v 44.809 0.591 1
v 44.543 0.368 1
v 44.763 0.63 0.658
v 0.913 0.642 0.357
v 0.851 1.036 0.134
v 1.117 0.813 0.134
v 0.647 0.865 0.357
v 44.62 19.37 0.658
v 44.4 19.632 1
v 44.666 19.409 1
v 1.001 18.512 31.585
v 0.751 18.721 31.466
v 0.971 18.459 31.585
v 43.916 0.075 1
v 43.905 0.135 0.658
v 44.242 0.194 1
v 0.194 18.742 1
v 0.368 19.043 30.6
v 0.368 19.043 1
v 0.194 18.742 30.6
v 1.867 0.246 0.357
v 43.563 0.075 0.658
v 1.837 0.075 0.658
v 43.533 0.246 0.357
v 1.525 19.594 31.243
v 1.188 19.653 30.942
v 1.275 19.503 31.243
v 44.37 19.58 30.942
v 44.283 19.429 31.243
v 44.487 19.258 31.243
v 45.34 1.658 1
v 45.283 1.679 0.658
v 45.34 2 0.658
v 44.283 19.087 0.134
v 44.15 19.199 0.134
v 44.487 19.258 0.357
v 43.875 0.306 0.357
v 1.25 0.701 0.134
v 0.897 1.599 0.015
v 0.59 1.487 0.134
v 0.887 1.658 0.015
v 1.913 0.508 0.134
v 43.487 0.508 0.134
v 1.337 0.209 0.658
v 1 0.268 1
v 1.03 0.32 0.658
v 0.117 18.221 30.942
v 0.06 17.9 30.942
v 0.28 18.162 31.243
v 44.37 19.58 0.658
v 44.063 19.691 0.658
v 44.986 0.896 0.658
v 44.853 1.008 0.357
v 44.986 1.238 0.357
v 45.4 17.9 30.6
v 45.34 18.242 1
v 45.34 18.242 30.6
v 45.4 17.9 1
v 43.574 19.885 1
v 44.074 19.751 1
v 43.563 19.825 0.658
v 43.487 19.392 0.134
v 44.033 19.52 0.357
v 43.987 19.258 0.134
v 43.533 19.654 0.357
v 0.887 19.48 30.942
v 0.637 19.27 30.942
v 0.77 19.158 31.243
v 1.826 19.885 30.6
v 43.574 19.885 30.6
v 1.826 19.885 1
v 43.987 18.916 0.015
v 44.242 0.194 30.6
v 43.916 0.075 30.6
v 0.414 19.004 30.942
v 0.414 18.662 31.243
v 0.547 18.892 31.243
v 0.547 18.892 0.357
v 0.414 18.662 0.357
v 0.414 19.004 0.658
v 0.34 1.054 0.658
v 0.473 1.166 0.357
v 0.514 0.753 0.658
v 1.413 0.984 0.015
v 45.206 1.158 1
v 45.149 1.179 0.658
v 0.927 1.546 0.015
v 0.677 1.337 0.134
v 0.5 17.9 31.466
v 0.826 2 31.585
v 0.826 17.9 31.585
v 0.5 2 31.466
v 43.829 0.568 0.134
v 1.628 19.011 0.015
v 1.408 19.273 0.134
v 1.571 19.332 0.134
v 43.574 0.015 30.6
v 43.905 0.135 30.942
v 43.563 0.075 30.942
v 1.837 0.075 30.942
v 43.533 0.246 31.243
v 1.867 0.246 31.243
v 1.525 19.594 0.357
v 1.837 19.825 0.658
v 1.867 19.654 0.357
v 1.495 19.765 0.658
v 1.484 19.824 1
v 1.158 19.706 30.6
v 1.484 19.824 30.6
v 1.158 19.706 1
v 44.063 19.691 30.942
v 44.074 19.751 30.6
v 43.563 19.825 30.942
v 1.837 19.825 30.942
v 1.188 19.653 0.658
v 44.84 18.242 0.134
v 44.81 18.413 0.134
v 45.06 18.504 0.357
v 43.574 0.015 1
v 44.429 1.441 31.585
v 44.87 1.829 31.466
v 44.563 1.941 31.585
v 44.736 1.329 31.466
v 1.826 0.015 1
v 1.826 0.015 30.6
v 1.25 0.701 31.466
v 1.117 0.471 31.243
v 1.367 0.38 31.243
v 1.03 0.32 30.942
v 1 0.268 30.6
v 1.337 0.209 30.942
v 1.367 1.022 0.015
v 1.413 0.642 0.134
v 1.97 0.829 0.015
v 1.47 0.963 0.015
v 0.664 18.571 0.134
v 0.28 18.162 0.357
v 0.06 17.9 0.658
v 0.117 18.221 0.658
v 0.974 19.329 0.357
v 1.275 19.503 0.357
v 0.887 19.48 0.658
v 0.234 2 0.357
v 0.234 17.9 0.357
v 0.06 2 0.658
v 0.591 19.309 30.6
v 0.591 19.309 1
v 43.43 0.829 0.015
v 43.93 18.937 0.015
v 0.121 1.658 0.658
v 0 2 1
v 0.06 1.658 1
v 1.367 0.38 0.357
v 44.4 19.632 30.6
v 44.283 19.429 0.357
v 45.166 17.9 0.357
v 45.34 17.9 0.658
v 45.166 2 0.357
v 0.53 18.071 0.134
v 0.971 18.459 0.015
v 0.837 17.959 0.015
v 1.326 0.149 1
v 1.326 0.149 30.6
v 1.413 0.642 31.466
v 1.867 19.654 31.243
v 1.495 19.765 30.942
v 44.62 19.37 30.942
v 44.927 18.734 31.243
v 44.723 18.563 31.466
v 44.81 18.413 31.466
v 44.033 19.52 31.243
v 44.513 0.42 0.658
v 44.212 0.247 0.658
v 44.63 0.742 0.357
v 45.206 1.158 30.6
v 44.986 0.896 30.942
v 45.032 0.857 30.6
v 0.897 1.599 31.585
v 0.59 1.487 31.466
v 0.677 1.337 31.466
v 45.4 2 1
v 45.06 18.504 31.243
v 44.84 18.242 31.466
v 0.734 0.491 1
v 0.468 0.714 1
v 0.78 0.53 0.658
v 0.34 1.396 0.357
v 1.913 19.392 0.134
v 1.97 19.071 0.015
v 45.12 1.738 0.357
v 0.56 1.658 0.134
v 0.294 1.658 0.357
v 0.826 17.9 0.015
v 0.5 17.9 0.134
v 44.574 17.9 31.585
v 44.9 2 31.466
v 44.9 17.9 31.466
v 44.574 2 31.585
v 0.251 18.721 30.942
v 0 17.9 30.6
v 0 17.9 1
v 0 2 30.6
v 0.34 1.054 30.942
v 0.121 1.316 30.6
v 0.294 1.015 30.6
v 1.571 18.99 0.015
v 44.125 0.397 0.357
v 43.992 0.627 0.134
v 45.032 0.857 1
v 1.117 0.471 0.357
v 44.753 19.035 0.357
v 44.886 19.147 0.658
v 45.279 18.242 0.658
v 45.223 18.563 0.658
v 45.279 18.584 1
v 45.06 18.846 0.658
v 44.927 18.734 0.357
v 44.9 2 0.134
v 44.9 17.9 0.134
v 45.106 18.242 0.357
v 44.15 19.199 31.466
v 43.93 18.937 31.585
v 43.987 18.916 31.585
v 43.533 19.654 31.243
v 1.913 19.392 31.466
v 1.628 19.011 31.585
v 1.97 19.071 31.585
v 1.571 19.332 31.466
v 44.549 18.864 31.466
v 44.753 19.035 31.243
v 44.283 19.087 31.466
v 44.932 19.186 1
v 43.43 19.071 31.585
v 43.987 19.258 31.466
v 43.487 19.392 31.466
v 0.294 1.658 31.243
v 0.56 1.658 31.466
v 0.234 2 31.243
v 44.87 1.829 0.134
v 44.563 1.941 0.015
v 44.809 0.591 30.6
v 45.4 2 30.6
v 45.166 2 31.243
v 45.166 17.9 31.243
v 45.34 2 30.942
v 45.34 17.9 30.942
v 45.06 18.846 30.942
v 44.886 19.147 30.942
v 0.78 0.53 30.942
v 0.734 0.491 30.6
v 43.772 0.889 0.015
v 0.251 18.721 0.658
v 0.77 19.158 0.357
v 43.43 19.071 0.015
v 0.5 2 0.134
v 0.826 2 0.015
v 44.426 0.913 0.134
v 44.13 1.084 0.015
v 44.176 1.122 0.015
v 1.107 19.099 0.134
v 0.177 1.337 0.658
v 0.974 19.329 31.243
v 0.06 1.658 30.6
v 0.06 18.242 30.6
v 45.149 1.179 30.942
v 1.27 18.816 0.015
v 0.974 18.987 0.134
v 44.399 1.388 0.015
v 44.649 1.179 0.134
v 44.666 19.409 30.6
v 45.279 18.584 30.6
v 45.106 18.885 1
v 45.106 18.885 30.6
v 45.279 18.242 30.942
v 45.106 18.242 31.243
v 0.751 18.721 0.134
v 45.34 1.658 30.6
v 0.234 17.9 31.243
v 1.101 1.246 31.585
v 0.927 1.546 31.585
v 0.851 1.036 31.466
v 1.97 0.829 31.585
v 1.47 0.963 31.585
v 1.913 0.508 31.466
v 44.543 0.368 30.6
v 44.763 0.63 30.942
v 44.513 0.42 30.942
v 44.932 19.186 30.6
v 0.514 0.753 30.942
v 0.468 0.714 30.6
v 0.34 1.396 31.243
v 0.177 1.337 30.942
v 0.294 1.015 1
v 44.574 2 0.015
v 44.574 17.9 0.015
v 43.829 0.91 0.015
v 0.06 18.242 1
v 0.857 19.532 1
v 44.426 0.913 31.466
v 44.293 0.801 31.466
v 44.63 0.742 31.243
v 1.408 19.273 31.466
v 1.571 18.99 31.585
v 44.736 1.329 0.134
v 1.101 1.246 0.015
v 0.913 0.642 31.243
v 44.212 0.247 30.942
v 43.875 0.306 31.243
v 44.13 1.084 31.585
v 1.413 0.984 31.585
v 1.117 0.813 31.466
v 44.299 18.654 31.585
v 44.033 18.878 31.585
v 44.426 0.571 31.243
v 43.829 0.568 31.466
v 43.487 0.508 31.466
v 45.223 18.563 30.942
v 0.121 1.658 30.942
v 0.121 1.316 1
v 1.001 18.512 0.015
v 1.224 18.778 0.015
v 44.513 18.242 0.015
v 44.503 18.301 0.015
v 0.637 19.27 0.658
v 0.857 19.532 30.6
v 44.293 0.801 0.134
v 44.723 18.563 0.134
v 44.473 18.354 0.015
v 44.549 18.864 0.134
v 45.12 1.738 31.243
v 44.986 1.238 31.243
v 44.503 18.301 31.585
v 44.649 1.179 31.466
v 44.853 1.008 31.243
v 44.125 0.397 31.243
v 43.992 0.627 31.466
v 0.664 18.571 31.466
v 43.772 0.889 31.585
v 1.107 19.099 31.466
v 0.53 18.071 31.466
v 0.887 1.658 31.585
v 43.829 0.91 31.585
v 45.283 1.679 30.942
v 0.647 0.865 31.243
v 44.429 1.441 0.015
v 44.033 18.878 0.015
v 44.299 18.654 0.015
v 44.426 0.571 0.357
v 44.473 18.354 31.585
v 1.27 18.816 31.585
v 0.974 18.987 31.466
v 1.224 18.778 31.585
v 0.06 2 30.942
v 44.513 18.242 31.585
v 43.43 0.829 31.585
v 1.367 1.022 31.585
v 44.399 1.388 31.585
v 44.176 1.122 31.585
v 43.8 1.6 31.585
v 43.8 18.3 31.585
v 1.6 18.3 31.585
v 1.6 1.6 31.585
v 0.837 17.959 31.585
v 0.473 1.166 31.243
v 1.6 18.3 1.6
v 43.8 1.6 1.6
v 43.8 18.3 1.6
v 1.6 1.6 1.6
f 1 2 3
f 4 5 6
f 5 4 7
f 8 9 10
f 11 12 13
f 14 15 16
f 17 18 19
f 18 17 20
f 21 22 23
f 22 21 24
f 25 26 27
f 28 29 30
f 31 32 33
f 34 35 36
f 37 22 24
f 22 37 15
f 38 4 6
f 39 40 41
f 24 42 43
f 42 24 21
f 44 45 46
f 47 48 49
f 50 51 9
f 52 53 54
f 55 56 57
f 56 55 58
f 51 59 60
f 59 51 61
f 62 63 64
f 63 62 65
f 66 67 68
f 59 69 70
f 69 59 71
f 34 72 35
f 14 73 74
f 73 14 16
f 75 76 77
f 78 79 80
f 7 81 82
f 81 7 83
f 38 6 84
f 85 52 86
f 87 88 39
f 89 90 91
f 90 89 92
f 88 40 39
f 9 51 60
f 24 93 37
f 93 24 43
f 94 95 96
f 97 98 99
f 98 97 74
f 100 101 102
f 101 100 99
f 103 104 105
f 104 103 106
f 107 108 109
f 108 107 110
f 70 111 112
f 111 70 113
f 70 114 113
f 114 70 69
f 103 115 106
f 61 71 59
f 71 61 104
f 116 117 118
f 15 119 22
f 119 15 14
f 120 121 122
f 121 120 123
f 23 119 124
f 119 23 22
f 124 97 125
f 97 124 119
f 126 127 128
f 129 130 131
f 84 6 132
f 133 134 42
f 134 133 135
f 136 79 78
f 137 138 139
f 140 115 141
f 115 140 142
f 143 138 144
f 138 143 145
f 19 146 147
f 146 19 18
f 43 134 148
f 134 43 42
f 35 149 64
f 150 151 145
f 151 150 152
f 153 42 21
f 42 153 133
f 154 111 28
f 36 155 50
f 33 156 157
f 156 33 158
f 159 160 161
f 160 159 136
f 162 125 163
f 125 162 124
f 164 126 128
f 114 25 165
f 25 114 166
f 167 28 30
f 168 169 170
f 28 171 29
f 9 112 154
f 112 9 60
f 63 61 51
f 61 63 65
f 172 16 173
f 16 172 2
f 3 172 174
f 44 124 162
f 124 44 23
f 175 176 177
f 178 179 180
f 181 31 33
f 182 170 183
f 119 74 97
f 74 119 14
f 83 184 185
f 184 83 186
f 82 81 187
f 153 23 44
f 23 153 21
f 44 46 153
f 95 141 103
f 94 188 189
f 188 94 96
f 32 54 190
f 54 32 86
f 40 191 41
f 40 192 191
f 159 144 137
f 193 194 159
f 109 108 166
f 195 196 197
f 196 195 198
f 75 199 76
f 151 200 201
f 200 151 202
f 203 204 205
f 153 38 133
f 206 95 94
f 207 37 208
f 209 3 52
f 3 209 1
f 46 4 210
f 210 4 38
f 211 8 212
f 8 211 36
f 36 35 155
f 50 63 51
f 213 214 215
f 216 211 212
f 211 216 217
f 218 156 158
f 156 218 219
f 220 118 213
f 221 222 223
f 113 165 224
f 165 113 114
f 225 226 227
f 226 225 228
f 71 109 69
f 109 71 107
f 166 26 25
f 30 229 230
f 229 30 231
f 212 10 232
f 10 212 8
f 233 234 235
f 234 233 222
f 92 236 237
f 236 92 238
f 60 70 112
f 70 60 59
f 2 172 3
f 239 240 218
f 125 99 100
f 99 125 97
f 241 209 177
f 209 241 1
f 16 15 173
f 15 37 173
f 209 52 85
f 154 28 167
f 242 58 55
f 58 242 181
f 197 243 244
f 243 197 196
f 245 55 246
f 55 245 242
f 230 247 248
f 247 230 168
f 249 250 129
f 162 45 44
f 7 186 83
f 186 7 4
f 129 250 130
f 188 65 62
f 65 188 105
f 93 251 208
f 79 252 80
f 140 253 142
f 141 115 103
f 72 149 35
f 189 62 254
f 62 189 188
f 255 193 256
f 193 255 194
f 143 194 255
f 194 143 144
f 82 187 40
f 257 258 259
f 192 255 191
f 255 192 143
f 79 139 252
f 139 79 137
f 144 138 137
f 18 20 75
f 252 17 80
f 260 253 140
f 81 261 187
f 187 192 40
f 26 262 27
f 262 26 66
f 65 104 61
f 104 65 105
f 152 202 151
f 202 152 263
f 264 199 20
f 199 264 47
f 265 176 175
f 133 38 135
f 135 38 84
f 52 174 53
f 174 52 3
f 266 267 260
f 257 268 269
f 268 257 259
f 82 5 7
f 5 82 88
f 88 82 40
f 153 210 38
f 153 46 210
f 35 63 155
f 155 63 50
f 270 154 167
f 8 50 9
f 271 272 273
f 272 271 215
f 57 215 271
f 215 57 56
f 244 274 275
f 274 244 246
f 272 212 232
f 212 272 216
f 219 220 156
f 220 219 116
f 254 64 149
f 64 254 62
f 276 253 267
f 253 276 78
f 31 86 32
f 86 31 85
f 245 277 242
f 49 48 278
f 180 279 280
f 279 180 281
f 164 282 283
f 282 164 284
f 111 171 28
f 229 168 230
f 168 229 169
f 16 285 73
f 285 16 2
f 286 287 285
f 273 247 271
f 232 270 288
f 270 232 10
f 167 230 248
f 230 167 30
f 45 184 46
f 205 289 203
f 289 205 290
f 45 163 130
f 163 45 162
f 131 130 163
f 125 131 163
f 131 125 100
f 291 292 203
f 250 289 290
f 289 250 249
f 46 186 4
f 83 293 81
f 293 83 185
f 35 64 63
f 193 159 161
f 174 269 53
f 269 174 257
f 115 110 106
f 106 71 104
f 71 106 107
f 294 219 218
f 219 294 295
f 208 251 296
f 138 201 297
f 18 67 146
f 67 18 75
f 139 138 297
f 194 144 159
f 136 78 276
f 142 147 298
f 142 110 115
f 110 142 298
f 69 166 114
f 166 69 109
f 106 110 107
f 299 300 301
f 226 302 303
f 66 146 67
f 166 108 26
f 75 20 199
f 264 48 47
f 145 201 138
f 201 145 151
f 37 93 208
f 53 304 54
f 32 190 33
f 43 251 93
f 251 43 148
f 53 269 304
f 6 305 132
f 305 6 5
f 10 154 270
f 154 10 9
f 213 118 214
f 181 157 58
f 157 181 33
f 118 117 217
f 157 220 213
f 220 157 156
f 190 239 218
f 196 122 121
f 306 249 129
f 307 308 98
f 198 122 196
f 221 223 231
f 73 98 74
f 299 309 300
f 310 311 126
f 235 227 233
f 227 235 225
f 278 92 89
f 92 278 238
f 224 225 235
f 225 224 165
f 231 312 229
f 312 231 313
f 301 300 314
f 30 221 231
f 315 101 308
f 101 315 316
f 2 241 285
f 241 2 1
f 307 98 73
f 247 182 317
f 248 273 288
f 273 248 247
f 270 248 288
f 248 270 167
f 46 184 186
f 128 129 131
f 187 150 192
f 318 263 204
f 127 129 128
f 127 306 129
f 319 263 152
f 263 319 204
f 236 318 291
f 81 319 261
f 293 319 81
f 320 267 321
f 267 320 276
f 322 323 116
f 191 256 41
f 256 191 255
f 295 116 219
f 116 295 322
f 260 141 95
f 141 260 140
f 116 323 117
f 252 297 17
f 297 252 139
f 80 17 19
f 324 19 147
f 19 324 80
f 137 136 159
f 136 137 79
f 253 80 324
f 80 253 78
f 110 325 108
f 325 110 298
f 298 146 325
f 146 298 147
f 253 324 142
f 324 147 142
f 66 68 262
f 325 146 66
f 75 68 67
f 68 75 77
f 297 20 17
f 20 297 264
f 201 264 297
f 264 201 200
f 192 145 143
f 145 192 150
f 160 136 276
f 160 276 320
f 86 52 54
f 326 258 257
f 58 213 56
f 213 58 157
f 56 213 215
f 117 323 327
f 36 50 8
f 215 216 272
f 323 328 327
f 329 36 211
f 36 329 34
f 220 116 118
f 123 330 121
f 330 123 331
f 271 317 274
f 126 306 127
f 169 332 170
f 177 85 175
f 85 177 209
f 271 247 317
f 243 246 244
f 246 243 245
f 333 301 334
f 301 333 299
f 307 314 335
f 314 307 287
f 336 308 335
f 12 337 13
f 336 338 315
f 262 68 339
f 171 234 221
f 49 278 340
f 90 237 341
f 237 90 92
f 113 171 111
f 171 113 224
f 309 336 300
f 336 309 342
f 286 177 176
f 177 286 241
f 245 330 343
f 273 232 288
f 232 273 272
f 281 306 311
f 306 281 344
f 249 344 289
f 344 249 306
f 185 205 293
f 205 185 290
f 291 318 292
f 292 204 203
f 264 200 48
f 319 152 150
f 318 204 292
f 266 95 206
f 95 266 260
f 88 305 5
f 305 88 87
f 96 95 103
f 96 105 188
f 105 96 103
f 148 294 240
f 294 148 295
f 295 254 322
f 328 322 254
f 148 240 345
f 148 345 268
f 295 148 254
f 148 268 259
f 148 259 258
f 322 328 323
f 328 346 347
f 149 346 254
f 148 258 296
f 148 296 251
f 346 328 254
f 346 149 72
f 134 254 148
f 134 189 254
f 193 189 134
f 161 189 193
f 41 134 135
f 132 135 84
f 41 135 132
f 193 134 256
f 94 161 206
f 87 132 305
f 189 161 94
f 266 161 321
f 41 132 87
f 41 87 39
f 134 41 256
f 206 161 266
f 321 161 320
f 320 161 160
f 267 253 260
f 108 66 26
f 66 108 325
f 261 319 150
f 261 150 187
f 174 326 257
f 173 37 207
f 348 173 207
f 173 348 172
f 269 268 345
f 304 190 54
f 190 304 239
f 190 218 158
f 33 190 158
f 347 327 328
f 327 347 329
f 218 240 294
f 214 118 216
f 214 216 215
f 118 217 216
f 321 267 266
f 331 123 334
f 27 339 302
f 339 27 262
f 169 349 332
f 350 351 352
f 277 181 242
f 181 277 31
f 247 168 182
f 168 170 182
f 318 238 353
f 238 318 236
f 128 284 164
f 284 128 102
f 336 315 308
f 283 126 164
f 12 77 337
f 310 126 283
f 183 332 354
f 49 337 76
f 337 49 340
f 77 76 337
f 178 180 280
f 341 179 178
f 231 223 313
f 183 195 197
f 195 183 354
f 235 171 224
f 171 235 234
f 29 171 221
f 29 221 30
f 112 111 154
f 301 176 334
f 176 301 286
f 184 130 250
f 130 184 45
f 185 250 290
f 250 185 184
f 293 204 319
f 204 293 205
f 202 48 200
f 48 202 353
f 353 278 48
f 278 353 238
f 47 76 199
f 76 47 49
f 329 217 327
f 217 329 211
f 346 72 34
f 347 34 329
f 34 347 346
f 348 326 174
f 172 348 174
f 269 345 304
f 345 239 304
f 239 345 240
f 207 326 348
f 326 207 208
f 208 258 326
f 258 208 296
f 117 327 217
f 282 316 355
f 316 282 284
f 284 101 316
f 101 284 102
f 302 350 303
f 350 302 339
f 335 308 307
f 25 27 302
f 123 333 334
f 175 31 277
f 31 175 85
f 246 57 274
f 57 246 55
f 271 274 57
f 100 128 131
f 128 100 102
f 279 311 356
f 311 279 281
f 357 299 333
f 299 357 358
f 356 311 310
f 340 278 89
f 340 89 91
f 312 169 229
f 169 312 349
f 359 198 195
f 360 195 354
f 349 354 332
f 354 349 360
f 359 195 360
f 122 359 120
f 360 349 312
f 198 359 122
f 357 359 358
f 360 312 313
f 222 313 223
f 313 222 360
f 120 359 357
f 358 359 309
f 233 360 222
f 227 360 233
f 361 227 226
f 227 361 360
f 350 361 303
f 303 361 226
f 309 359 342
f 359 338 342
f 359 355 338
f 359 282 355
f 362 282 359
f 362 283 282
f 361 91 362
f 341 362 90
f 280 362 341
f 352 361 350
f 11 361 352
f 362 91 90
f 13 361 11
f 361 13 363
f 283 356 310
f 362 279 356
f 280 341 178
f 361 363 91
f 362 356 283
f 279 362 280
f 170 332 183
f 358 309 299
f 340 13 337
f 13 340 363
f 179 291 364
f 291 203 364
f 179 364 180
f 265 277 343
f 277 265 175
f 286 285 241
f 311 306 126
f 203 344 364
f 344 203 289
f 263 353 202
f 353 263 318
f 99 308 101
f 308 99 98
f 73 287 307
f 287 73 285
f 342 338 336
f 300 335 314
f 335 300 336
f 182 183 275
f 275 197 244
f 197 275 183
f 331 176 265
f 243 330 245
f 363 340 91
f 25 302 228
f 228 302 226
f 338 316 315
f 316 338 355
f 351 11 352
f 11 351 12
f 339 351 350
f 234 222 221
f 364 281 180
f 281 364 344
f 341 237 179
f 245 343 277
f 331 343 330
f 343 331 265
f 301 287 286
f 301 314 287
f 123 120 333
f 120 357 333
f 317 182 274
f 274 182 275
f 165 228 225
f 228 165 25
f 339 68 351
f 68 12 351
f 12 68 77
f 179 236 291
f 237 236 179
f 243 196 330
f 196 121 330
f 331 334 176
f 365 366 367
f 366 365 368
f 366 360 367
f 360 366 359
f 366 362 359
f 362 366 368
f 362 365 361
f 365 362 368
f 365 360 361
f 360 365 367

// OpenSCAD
// =============================================
// 3D: phone iphone14 mini table holder — base
// Version: 2.0
// Author: generator
// =============================================

// Short description for models table
description = "";
version_str = "2.0";

// Модель стоит вертикально, по xy вырезом вниз, его видно с фронтальной проекции
// Карман шириной с телефон с зазором, y - толщина телефона с зазором, z - высота телефона
// Спереди вырез под камеру, z - высота выреза. Телефон стоит камерами вверх, экраном назад.
// Телефон (с учётом чехла/кнопок)


// ----------------------------
// Параметры модели (все размеры в мм)
// ----------------------------
is_small = false;
phone_w = is_small ? 42 : 42; // ширина телефона по X, с боковыми кнопками
phone_h_gap = 10;
phone_h = is_small ? 30 : 30; // высота телефона (идёт в глубину кармана) по Y
phone_th = is_small ? 16.5 : 16.5; // толщина телефона по Z
notch_camera_z = is_small ? phone_h - 0 : 32 - phone_h_gap;

// Зазоры кармана (внутренние)
pocket_clear_x = 0.2; // общий запас по X (ширина) — суммарно (0 для точного соответствия)
pocket_clear_y = 0.2; // запас по Y (толщина)
pocket_clear_z = 0; // запас по Z (высота)

// Стенки/толщины
wall_xy  = is_small ? 2 : 1.6;  // толщина боковой стенки (X/Y)
wall_z   = is_small ? 2 : 1.6;  // толщина снизу/сверху (Z)

// Скругления
radius_r = 2;
mink_r   = 1;

print_notch = false; // output notch difference




use <../modules.scad>

// ----------------------------
// Настройка точности
// ----------------------------
$fn = 0;        // фиксированную сегментацию отключаем
$fa = 6;        // 5–8° обычно достаточно
$fs = 0.35;     // ≈ диаметр сопла (0.3–0.5 для сопла 0.4)
pin_fs = 0.25;  // чуть тоньше для штырей и отверстий

// ----------------------------
// Вычисляемые переменные
// ----------------------------
inner_x = phone_w + pocket_clear_x;
inner_y = phone_th + pocket_clear_y;
inner_z = phone_h + pocket_clear_z;
outer_x = inner_x + 2 * wall_xy;
outer_y = inner_y + 2 * wall_xy;
outer_z = inner_z + wall_z;

// ----------------------------
// Модули фрагментов модели
// ----------------------------
module base(){
    rounded_prism_with_pocket(
        size=[outer_x, outer_y],
        h=outer_z,
        r=radius_r,
        kr=mink_r,
        wall_th=wall_xy,
        h_th=wall_z,
        pocket_r=0 // sharp-cornered pocket, as printed (pre-v1.3 modules.scad default)
    );
}

module notch(){
    translate([wall_xy, -eps(), outer_z - notch_camera_z])
        rounded_prism(
            size=[inner_x, wall_xy + 2*eps()],
            h=notch_camera_z + eps()
        );
}

// Вывод всех деталей
module all_details(){
    // mink(mink_r, [outer_x, outer_y, outer_z], kernel="sphere"){ 
        if(print_notch) { difference(){ base(); notch(); } }
        else base();
    // }
}

// ----------------------------
// ВЫВОД МОДЕЛИ
// ----------------------------
module render(){
    clip_for_fragments(){ all_details(); }
}

render();
